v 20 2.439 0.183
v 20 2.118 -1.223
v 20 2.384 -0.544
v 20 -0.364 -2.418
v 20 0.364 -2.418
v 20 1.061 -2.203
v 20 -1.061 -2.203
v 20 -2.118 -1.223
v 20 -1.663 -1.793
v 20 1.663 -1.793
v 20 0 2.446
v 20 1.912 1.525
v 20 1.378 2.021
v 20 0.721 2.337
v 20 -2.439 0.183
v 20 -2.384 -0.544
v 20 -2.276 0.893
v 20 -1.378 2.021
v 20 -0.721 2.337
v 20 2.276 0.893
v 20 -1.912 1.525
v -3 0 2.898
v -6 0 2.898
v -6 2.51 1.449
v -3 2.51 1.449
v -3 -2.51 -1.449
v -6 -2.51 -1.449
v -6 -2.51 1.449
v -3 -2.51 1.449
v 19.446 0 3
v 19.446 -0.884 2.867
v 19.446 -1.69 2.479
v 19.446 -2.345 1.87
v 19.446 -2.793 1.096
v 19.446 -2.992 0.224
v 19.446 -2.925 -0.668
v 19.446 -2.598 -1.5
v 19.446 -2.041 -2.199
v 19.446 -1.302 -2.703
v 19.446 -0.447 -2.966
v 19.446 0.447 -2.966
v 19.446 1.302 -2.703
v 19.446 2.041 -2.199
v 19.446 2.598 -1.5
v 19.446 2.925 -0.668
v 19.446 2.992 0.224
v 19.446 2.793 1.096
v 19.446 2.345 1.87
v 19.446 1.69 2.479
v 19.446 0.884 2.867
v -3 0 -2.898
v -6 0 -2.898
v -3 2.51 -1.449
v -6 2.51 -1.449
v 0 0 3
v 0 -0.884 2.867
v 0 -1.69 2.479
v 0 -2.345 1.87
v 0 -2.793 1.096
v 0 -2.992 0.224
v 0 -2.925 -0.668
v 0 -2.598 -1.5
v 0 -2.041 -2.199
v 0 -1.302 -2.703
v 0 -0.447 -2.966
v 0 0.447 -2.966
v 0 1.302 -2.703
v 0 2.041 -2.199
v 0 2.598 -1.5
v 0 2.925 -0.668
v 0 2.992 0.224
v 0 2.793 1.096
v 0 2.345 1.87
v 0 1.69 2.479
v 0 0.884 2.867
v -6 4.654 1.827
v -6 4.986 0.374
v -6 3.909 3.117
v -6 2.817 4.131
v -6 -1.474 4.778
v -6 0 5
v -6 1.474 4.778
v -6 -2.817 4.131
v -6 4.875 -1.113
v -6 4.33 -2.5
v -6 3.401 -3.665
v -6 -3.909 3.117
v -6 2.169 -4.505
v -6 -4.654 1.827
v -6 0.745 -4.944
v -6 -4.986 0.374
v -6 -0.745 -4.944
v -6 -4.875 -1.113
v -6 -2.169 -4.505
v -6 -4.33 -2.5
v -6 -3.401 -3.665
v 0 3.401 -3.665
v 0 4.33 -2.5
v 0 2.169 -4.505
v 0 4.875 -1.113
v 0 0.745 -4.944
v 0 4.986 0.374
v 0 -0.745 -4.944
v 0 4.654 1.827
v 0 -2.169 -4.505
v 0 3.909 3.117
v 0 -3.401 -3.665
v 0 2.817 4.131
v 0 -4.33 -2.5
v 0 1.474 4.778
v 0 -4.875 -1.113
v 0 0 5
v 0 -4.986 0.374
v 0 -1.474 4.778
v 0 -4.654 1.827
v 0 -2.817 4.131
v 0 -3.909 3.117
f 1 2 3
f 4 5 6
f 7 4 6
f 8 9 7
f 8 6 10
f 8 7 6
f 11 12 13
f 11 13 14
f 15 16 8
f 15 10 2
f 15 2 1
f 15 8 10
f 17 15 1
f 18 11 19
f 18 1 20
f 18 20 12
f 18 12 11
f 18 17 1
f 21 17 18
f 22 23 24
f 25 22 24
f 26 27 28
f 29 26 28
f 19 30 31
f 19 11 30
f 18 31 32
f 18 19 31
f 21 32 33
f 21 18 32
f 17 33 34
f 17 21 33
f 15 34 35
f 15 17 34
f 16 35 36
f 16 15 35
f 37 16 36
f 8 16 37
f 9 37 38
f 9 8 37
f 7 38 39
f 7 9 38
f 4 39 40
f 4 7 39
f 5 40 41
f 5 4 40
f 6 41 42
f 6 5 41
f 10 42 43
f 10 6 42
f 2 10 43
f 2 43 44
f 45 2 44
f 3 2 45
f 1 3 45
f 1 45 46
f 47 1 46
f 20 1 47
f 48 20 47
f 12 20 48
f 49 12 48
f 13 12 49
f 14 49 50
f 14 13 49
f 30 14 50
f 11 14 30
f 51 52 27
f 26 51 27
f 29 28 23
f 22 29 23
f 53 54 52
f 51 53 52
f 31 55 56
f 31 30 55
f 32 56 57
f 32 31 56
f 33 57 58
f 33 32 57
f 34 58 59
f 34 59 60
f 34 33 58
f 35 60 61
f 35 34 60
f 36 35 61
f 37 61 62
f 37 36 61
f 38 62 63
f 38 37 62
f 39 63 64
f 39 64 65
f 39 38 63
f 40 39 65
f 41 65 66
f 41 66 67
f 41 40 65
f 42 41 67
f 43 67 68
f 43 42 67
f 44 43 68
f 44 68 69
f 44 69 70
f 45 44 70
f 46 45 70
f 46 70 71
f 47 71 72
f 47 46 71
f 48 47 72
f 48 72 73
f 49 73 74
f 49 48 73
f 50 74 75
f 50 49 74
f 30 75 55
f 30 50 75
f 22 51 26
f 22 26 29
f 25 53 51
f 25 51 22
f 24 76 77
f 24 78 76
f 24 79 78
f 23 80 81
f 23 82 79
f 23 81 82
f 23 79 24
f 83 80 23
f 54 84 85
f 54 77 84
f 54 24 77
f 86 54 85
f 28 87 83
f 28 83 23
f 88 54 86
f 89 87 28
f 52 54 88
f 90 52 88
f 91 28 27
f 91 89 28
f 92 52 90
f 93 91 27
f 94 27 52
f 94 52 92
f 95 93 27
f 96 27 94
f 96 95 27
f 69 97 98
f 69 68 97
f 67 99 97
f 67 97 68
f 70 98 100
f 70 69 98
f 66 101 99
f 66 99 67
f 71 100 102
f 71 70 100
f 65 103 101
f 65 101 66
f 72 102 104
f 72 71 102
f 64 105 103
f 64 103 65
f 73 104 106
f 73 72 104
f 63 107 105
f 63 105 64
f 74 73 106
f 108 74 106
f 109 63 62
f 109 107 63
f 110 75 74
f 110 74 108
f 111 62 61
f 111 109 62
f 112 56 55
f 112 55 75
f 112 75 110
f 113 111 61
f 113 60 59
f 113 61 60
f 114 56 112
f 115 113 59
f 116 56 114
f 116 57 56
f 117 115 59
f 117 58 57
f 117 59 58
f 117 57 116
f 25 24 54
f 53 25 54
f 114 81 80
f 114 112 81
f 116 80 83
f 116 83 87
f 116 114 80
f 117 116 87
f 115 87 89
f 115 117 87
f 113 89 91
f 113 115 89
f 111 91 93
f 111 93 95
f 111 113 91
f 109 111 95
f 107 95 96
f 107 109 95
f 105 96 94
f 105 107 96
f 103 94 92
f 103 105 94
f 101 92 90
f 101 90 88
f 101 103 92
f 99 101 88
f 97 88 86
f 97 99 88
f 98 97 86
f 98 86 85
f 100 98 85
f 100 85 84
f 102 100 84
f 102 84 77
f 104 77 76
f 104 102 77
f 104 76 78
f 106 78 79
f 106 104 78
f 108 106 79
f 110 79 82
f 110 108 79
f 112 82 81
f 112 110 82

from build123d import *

# Parameters (mm, degrees)
HEXDRIVE_DEPTH = 3


with BuildPart() as part:
    # BodySketch → Base-Revolve (revolve)
    with BuildSketch(Plane(origin=(0, 0, 0), x_dir=(1, 0, 0), z_dir=(0, 1, 0)), mode=Mode.PRIVATE) as base_revolve_sk:
        Polygon((-6, 0), (-6, 5), (0, 5), (0, 3), (19.4455, 3), (20, 2.4455), (20, 0), align=None)
    revolve(base_revolve_sk.sketch.rotate(Axis((-6, 0, 0), (1, 0, 0)), 180), axis=Axis((-6, 0, 0), (1, 0, 0)))

    # DriveSketch → HexDrive (cut)
    with BuildSketch(Plane.ZY.offset(6)):
        Polygon((2.898298351, 0), (1.449149176, 2.51), (-1.449149176, 2.51), (-2.898298351, 0), (-1.449149176, -2.51), (1.449149176, -2.51), align=None)
    extrude(amount=-HEXDRIVE_DEPTH, mode=Mode.SUBTRACT)


solid = part.part
